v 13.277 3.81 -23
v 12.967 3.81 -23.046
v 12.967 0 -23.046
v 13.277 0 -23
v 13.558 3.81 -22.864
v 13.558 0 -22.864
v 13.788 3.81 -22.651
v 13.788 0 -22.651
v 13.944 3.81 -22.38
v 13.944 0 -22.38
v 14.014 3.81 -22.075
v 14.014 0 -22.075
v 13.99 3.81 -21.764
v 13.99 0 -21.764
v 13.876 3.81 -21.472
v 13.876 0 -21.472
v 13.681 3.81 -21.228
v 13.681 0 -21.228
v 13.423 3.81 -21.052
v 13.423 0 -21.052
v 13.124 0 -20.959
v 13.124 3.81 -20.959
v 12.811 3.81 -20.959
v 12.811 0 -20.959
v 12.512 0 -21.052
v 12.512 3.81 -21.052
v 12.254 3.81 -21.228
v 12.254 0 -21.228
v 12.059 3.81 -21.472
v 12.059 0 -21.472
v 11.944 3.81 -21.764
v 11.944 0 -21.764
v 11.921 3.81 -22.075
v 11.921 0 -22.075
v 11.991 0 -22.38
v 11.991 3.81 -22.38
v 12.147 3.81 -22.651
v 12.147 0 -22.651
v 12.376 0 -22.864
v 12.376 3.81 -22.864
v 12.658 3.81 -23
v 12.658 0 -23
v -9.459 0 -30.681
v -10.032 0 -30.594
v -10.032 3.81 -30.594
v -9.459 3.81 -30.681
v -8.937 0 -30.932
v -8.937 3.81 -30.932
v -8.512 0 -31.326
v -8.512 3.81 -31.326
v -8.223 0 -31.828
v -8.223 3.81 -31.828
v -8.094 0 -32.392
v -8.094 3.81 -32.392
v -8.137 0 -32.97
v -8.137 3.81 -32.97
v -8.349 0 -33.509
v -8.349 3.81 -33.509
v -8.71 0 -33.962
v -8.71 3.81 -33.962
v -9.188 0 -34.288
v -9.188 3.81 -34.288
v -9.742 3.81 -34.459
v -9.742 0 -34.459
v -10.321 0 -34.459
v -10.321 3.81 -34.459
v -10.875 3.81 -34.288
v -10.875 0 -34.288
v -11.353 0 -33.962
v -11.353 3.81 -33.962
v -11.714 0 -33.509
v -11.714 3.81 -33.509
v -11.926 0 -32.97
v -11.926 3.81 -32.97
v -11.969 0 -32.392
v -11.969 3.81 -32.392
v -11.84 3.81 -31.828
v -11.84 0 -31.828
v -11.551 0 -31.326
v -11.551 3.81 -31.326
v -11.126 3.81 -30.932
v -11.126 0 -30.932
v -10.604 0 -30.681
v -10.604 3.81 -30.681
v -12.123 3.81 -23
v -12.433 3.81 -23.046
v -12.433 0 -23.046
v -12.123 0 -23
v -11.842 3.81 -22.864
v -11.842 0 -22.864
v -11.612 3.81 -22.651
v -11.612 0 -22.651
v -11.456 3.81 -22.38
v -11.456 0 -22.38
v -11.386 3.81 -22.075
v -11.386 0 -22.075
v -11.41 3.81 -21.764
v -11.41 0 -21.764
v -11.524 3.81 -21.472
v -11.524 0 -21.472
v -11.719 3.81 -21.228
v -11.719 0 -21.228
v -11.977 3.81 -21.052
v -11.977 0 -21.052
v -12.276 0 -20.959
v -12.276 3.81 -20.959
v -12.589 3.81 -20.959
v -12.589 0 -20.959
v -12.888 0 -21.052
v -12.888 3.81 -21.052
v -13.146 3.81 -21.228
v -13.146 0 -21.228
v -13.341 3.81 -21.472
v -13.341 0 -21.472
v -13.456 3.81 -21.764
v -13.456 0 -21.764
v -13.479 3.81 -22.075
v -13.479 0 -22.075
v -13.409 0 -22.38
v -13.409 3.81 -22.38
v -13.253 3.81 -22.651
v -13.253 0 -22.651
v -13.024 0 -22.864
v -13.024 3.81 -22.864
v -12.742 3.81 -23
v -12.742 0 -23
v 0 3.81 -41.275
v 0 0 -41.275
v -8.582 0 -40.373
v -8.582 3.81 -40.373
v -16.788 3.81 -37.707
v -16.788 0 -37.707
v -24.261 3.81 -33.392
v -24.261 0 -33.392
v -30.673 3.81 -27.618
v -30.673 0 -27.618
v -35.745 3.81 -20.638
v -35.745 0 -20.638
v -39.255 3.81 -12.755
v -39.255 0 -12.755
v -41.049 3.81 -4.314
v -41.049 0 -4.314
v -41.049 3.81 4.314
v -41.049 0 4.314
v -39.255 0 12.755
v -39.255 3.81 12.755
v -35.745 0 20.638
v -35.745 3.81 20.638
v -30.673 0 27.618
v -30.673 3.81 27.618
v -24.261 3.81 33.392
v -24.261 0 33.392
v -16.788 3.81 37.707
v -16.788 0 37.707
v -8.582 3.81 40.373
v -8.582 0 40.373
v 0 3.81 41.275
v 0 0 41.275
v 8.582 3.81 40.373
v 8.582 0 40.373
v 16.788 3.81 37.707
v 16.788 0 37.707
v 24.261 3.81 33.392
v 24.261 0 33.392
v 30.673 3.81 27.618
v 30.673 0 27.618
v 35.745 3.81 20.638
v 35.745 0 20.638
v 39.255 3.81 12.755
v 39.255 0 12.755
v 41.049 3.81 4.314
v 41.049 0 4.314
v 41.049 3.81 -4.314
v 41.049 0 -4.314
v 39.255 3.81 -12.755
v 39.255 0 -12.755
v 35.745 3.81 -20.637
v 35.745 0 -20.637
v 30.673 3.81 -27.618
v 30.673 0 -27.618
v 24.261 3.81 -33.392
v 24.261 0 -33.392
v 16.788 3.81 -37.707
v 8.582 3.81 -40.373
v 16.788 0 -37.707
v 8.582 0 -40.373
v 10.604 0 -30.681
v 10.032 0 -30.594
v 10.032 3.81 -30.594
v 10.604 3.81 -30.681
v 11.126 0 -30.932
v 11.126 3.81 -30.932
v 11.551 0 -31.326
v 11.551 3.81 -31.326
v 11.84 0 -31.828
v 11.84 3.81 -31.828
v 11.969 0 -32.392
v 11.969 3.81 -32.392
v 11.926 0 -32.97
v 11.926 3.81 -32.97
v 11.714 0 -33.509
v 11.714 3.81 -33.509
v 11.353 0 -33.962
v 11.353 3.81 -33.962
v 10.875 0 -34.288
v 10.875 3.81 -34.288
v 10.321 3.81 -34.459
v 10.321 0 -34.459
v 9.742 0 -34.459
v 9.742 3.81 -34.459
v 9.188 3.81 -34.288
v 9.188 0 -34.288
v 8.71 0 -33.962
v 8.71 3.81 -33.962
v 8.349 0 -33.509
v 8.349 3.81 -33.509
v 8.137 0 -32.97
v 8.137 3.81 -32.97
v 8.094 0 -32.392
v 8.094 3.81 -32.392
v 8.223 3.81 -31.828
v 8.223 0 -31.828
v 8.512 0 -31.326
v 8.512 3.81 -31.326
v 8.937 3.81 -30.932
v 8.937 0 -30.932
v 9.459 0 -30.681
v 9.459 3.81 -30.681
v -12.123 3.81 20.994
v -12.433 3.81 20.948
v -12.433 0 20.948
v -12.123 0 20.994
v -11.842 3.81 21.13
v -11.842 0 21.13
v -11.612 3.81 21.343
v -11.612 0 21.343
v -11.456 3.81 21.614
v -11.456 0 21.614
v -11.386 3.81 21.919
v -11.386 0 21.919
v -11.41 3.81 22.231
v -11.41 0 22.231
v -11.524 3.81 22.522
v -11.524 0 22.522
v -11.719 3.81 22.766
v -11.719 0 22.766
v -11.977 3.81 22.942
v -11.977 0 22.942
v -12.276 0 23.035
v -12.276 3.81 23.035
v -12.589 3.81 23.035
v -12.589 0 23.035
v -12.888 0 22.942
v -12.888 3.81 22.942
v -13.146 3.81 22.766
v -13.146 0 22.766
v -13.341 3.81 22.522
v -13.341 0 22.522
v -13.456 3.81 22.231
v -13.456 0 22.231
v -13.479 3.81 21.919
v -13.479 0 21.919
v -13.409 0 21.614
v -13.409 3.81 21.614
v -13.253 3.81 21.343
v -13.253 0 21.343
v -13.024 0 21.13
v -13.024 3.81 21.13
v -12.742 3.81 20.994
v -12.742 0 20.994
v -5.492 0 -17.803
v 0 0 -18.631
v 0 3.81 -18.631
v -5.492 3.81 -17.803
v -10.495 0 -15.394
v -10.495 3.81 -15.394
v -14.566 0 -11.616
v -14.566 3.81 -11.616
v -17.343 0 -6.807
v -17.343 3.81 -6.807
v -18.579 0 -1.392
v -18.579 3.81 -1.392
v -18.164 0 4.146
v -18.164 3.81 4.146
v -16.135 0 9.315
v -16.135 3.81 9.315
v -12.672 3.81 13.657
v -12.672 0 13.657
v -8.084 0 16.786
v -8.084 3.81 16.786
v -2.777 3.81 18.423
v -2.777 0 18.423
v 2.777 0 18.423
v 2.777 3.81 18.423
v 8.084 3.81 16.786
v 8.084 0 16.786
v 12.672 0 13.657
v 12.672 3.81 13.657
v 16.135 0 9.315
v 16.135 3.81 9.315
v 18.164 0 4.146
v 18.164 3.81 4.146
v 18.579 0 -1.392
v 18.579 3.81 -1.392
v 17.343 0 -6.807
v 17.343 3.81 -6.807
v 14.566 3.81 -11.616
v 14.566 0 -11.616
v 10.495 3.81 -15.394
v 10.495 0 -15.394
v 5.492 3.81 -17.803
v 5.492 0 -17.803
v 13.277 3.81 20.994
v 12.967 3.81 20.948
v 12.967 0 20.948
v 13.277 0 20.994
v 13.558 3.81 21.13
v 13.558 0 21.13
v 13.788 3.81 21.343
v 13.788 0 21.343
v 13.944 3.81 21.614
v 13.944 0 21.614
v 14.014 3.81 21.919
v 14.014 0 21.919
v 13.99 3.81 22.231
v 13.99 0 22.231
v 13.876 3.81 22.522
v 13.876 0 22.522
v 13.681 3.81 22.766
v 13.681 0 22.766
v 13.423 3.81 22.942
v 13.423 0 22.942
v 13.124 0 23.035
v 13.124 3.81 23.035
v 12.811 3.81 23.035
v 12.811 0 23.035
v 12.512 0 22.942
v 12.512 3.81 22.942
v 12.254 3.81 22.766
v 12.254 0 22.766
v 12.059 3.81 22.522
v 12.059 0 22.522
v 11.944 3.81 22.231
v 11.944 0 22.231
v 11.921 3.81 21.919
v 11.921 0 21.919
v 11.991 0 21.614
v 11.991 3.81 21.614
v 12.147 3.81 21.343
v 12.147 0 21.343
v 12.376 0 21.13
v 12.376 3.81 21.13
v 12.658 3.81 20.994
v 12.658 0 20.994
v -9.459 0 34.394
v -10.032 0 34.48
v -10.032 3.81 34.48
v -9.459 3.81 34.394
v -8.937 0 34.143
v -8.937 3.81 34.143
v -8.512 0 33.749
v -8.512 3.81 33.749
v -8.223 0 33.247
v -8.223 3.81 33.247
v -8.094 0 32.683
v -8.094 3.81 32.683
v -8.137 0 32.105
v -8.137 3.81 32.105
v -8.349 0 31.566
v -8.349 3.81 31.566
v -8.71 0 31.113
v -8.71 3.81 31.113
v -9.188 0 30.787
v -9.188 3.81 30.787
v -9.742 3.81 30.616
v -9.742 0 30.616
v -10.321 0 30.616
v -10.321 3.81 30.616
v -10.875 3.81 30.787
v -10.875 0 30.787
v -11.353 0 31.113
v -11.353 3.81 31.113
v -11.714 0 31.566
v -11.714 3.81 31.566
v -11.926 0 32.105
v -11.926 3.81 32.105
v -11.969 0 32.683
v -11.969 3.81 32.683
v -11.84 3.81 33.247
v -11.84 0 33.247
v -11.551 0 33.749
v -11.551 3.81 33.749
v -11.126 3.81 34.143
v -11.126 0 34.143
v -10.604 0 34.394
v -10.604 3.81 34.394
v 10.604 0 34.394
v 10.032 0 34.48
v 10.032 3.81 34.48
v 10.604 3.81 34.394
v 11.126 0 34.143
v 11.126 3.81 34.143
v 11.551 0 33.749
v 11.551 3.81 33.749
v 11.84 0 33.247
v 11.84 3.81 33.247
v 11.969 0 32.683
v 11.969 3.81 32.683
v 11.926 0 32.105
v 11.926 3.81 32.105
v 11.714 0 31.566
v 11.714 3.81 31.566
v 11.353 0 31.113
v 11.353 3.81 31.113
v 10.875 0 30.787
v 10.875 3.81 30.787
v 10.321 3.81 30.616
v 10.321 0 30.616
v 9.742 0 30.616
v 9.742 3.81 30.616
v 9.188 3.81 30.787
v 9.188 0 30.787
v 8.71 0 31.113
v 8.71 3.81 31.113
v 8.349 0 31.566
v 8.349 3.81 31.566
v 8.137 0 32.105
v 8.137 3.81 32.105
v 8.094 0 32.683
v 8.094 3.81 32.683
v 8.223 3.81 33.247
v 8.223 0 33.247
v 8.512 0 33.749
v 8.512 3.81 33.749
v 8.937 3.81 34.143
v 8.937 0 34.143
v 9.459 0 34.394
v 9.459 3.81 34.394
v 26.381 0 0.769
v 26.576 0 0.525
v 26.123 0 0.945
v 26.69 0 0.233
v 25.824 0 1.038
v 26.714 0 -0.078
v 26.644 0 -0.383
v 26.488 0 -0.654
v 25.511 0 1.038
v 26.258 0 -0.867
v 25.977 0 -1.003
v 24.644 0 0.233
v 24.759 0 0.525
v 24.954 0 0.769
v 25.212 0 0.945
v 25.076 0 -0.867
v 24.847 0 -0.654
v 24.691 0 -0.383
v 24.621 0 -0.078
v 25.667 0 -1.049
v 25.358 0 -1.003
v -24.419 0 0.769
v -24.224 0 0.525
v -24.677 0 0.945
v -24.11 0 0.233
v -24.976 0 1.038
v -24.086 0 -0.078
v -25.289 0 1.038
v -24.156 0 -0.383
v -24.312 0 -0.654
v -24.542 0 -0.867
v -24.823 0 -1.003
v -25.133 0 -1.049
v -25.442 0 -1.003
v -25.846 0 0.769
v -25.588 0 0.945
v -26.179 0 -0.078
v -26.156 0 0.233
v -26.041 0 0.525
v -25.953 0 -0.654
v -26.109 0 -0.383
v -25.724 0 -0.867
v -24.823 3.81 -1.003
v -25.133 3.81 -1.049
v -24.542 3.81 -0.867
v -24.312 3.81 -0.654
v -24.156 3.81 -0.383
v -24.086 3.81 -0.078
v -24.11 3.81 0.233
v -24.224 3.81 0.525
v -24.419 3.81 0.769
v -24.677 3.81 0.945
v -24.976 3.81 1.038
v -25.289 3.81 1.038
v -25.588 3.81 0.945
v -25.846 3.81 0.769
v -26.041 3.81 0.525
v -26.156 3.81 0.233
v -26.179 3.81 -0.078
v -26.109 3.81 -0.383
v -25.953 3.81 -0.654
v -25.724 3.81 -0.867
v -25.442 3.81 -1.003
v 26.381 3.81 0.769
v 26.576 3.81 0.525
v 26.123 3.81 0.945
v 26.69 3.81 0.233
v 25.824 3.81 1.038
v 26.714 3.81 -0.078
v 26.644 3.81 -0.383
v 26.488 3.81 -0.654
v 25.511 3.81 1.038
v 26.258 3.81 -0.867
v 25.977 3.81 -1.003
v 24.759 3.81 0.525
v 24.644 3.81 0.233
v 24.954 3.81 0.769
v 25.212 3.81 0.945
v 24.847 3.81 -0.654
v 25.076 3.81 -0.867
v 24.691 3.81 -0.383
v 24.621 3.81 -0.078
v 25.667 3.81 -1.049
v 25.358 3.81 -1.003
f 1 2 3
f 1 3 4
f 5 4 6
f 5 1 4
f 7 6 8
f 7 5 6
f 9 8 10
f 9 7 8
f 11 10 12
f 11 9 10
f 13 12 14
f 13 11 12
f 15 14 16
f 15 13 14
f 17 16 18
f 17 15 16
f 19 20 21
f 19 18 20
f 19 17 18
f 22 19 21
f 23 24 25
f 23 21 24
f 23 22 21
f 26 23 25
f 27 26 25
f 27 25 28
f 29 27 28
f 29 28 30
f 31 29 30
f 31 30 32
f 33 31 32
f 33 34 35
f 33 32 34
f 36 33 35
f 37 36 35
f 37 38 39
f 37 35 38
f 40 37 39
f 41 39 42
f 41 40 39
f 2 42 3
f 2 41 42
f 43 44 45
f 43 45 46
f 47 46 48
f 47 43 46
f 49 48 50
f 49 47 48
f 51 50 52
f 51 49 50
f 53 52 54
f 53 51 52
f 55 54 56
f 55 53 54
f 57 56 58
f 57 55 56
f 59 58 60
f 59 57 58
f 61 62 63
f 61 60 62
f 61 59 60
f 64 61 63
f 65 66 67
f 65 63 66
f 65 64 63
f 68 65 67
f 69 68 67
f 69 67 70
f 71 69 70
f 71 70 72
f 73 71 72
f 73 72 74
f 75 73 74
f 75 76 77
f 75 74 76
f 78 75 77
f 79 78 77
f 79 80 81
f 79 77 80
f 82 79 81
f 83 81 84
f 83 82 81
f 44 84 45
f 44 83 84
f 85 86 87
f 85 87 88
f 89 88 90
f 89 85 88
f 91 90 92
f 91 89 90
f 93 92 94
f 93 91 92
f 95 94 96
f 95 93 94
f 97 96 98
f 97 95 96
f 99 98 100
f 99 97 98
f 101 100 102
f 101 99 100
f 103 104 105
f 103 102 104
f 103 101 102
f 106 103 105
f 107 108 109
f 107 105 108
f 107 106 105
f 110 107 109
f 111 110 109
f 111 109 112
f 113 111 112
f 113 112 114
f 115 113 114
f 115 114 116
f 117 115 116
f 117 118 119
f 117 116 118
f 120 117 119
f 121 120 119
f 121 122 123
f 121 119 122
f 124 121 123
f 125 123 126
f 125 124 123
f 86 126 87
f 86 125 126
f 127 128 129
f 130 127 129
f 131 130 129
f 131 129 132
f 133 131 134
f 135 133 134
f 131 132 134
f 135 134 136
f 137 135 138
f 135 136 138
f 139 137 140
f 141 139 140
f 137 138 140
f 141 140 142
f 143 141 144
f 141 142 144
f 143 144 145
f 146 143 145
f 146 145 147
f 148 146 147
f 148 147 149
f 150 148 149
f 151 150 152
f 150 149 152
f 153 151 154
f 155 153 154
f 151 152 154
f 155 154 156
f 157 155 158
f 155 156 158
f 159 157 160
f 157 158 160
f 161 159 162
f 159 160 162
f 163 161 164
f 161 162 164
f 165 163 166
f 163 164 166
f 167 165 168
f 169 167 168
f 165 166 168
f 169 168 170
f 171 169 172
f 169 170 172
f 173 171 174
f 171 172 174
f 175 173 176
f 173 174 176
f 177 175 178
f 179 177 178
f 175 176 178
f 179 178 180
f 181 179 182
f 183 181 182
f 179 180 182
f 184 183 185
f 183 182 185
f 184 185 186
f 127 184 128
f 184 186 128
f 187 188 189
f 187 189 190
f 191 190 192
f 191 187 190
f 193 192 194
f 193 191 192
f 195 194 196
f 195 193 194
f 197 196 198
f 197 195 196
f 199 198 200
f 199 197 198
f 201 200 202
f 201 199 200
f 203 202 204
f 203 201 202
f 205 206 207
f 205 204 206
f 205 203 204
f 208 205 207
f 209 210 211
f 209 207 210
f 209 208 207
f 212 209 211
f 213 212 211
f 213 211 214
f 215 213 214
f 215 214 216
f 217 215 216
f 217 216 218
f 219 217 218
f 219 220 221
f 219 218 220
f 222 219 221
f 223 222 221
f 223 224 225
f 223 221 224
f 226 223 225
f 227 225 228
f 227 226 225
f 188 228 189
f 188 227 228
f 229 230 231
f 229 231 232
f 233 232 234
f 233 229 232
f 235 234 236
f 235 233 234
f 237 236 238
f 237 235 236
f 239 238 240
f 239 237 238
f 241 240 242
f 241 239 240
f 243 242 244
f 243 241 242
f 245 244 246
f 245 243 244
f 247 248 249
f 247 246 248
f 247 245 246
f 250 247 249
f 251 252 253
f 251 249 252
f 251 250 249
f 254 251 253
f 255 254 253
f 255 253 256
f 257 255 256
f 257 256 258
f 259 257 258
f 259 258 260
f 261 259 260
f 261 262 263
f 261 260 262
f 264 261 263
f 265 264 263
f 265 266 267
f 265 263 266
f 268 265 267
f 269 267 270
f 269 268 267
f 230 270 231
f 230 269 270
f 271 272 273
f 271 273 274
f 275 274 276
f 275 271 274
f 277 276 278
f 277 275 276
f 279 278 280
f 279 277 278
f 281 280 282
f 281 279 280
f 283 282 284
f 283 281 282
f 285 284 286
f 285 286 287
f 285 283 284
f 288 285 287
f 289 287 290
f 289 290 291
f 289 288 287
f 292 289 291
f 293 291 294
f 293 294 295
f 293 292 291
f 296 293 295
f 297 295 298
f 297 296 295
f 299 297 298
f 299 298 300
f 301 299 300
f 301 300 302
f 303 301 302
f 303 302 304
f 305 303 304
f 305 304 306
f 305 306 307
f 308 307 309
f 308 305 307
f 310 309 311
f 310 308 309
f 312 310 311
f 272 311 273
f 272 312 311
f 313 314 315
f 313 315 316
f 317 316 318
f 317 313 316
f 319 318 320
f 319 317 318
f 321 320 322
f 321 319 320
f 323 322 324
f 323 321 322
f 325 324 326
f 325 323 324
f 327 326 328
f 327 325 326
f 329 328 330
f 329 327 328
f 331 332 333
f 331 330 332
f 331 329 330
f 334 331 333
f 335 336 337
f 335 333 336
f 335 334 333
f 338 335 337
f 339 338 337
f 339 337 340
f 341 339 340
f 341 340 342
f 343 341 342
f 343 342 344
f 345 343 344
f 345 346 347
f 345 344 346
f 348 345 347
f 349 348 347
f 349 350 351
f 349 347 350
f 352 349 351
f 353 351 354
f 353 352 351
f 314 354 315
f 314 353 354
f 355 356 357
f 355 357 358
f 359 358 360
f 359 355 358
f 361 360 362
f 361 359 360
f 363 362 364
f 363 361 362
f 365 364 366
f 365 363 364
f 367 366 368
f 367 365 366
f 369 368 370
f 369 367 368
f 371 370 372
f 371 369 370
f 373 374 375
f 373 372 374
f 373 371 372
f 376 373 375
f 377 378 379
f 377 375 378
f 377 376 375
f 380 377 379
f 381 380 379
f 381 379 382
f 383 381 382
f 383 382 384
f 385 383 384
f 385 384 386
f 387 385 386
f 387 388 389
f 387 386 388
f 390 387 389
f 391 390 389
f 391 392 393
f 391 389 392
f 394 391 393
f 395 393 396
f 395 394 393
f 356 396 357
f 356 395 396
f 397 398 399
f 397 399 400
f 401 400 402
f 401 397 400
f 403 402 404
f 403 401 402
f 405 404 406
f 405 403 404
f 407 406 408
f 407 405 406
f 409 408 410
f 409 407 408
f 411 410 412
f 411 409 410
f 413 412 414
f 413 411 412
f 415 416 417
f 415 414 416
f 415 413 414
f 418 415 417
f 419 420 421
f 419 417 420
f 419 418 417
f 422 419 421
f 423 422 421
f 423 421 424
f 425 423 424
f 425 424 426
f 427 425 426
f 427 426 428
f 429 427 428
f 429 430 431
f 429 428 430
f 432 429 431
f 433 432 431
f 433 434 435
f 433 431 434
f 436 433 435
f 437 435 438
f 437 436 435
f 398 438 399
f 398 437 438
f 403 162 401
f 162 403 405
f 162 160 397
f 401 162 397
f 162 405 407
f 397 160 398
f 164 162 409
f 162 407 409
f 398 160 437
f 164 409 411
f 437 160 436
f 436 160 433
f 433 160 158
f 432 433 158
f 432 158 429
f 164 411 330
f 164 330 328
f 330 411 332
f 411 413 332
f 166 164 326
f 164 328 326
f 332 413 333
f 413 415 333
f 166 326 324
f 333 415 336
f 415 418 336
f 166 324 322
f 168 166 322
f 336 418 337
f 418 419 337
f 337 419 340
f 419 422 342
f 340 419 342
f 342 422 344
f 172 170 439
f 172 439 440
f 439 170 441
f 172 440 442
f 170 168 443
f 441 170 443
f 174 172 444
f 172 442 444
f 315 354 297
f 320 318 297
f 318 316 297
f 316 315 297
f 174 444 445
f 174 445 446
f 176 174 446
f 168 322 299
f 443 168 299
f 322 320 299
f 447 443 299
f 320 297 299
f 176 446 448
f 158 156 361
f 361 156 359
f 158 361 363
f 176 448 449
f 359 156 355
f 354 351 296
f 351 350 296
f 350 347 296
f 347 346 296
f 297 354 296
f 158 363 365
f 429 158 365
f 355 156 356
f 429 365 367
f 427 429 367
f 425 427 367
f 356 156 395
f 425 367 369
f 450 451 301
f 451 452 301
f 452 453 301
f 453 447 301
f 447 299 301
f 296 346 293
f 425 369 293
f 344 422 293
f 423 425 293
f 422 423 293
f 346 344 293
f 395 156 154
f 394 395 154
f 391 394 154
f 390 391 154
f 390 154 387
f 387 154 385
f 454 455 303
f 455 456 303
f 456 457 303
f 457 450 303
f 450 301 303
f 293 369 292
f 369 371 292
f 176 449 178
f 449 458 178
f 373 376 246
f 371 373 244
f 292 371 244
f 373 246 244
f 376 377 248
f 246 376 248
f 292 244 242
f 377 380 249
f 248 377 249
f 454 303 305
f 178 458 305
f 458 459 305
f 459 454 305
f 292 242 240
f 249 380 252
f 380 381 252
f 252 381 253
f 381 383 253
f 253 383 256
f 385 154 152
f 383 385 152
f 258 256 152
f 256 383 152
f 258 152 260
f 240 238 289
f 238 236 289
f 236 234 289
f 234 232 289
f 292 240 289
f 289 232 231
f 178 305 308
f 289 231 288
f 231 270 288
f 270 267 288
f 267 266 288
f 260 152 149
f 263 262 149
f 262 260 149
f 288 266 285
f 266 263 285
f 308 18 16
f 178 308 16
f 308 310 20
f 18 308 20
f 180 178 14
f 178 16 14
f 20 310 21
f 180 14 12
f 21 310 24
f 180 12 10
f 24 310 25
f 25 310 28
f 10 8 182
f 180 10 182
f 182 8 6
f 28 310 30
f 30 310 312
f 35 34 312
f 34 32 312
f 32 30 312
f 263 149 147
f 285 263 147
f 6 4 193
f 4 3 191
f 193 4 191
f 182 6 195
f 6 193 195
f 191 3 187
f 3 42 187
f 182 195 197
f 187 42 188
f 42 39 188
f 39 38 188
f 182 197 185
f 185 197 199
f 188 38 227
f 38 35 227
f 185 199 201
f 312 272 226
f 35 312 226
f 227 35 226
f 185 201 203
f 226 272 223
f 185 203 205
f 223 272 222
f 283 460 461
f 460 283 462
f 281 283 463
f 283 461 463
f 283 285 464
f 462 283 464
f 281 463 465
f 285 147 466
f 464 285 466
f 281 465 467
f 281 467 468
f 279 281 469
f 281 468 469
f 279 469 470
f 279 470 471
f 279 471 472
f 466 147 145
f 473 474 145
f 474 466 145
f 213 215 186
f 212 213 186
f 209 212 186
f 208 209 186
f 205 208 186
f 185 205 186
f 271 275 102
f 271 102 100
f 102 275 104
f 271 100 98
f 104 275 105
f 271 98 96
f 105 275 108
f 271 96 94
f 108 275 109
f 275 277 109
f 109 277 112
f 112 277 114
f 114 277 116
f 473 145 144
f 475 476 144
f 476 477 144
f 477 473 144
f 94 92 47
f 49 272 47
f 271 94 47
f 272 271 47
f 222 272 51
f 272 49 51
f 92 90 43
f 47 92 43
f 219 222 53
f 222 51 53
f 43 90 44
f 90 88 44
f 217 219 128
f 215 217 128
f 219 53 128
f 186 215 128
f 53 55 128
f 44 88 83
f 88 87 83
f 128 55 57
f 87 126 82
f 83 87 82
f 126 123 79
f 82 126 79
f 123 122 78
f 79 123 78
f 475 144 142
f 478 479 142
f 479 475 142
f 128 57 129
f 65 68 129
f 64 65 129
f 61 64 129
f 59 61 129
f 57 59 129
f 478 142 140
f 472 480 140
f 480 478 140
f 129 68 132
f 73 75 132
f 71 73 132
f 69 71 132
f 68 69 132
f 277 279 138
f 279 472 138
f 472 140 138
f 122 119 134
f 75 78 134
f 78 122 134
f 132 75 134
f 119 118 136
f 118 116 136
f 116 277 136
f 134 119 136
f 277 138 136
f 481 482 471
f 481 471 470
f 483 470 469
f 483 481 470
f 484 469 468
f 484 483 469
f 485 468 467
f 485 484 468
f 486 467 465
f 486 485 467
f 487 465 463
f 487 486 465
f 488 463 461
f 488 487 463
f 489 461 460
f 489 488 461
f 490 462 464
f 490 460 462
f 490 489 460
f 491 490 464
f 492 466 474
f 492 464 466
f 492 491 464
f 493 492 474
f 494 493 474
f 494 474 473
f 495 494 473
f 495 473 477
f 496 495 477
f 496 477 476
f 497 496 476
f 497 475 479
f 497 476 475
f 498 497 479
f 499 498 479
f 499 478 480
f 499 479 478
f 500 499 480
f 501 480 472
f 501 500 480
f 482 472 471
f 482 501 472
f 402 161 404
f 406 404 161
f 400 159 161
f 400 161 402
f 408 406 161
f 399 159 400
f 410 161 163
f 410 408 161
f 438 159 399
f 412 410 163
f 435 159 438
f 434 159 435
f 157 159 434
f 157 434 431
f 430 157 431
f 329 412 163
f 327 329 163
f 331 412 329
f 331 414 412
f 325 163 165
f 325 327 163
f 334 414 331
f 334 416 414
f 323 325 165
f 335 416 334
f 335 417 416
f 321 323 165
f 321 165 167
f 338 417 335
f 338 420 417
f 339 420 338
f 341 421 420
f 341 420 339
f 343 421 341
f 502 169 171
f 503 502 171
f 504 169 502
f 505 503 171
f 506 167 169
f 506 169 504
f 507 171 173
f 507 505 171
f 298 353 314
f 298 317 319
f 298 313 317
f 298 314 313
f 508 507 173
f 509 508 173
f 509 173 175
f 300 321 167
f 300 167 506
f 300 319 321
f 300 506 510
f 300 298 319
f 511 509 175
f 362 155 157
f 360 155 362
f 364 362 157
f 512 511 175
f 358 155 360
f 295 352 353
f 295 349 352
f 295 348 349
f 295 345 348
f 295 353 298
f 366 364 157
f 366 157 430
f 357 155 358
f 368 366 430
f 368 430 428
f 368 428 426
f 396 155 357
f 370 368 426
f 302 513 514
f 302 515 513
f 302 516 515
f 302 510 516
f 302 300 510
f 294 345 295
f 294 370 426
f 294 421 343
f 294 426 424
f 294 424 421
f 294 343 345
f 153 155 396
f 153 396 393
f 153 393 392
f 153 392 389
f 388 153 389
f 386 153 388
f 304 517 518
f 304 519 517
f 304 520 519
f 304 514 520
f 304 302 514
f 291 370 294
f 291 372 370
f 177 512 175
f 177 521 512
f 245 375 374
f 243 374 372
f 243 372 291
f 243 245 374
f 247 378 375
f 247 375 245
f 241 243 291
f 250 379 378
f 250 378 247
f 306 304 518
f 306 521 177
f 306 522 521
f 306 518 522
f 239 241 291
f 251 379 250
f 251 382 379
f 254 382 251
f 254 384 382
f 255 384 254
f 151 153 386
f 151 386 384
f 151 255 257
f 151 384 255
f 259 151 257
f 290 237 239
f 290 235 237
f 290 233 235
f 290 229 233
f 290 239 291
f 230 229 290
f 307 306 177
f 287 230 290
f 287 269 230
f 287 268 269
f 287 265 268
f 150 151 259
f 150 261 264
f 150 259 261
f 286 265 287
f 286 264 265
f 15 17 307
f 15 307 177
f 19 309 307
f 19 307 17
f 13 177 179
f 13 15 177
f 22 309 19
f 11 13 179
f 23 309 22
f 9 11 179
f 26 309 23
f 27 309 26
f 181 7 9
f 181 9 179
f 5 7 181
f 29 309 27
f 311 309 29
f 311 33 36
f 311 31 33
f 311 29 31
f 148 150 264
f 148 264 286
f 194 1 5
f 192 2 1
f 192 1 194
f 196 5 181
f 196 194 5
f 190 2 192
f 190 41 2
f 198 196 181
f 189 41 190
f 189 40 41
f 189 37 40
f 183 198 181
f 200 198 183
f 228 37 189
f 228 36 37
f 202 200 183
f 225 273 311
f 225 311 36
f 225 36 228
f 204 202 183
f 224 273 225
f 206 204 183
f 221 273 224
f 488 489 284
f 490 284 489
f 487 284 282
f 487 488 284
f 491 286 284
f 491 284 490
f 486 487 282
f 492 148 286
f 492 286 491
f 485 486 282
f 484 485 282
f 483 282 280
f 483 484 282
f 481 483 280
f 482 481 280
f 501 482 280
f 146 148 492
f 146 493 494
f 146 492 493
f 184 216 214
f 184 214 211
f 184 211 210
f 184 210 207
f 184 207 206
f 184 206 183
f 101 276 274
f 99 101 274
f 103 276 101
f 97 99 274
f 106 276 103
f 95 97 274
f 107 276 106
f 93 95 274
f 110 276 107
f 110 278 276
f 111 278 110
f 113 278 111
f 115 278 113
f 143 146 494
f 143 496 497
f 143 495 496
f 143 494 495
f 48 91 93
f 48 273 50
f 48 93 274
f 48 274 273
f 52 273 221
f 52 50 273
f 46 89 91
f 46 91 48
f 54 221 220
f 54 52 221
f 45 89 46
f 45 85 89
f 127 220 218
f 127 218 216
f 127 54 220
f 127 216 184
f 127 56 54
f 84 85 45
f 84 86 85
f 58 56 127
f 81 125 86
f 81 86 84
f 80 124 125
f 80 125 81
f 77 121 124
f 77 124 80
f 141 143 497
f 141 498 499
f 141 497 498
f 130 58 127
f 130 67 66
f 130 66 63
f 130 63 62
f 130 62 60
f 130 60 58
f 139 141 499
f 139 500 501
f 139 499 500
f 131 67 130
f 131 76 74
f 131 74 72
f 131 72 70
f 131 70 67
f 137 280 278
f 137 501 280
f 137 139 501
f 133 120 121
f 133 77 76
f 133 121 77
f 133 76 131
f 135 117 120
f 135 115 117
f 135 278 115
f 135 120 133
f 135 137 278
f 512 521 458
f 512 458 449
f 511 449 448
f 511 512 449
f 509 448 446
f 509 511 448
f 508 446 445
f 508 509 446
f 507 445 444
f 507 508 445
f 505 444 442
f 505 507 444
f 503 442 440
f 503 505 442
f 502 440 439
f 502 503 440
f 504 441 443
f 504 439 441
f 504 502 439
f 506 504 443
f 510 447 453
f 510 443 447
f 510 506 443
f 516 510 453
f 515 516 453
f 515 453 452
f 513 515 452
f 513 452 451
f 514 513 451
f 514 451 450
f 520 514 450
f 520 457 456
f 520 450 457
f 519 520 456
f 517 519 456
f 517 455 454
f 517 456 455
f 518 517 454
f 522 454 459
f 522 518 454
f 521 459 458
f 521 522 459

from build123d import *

# Parameters (mm, degrees)
SKETCH1_R               = 41.275
SKETCH1_R_2             = 18.6309
BOSS_EXTRUDE1_DEPTH     = 3.81
CUT_EXTRUDE1_DEPTH      = 59.495874641
CUT_EXTRUDE1_DEPTH_BACK = 59.495874641
SKETCH3_R               = 1.049274
CUT_EXTRUDE2_DEPTH      = 59.495874641
CUT_EXTRUDE2_DEPTH_BACK = 59.495874641
SKETCH4_R               = 1.9431


with BuildPart() as part:
    # Sketch1 → Boss-Extrude1 (new body)
    with BuildSketch(Plane(origin=(0, 0, 0), x_dir=(1, 0, 0), z_dir=(0, 1, 0))):
        with Locations(Location((0, 0, 0), (0, 0, 90))):
            Circle(SKETCH1_R)
        with Locations(Location((0, 0, 0), (0, 0, 90))):
            Circle(SKETCH1_R_2, mode=Mode.SUBTRACT)
    extrude(amount=BOSS_EXTRUDE1_DEPTH)

    # Sketch3 → Cut-Extrude1 (cut, two sides: drawn at the far end of the back side and taken through both)
    with BuildSketch(Plane.XZ.offset(-CUT_EXTRUDE1_DEPTH_BACK)):
        with Locations(Location((12.96732128, 21.997045256, 0), (0, 0, 270))):
            Circle(SKETCH3_R)
        with Locations(Location((-12.43267872, 21.997045256, 0), (0, 0, 270))):
            Circle(SKETCH3_R)
        with Locations(Location((-25.13267872, 0, 0), (0, 0, 270))):
            Circle(SKETCH3_R)
        with Locations(Location((-12.43267872, -21.997045256, 0), (0, 0, 270))):
            Circle(SKETCH3_R)
        with Locations(Location((12.96732128, -21.997045256, 0), (0, 0, 270))):
            Circle(SKETCH3_R)
        with Locations(Location((25.66732128, 0, 0), (0, 0, 270))):
            Circle(SKETCH3_R)
    extrude(amount=CUT_EXTRUDE1_DEPTH + CUT_EXTRUDE1_DEPTH_BACK, mode=Mode.SUBTRACT)

    # Sketch4 → Cut-Extrude2 (cut, two sides: drawn at the far end of the back side and taken through both)
    with BuildSketch(Plane(origin=(0, 3.81, 0), x_dir=(1, 0, 0), z_dir=(0, 1, 0)).offset(-CUT_EXTRUDE2_DEPTH_BACK)):
        with Locations(Location((-10.031528943, 32.5374, 0), (0, 0, 270))):
            Circle(SKETCH4_R)
        with Locations(Location((-10.031528943, -32.5374, 0), (0, 0, 270))):
            Circle(SKETCH4_R)
        with Locations(Location((10.031528943, -32.5374, 0), (0, 0, 270))):
            Circle(SKETCH4_R)
        with Locations(Location((10.031528943, 32.5374, 0), (0, 0, 270))):
            Circle(SKETCH4_R)
    extrude(amount=CUT_EXTRUDE2_DEPTH + CUT_EXTRUDE2_DEPTH_BACK, mode=Mode.SUBTRACT)


solid = part.part
